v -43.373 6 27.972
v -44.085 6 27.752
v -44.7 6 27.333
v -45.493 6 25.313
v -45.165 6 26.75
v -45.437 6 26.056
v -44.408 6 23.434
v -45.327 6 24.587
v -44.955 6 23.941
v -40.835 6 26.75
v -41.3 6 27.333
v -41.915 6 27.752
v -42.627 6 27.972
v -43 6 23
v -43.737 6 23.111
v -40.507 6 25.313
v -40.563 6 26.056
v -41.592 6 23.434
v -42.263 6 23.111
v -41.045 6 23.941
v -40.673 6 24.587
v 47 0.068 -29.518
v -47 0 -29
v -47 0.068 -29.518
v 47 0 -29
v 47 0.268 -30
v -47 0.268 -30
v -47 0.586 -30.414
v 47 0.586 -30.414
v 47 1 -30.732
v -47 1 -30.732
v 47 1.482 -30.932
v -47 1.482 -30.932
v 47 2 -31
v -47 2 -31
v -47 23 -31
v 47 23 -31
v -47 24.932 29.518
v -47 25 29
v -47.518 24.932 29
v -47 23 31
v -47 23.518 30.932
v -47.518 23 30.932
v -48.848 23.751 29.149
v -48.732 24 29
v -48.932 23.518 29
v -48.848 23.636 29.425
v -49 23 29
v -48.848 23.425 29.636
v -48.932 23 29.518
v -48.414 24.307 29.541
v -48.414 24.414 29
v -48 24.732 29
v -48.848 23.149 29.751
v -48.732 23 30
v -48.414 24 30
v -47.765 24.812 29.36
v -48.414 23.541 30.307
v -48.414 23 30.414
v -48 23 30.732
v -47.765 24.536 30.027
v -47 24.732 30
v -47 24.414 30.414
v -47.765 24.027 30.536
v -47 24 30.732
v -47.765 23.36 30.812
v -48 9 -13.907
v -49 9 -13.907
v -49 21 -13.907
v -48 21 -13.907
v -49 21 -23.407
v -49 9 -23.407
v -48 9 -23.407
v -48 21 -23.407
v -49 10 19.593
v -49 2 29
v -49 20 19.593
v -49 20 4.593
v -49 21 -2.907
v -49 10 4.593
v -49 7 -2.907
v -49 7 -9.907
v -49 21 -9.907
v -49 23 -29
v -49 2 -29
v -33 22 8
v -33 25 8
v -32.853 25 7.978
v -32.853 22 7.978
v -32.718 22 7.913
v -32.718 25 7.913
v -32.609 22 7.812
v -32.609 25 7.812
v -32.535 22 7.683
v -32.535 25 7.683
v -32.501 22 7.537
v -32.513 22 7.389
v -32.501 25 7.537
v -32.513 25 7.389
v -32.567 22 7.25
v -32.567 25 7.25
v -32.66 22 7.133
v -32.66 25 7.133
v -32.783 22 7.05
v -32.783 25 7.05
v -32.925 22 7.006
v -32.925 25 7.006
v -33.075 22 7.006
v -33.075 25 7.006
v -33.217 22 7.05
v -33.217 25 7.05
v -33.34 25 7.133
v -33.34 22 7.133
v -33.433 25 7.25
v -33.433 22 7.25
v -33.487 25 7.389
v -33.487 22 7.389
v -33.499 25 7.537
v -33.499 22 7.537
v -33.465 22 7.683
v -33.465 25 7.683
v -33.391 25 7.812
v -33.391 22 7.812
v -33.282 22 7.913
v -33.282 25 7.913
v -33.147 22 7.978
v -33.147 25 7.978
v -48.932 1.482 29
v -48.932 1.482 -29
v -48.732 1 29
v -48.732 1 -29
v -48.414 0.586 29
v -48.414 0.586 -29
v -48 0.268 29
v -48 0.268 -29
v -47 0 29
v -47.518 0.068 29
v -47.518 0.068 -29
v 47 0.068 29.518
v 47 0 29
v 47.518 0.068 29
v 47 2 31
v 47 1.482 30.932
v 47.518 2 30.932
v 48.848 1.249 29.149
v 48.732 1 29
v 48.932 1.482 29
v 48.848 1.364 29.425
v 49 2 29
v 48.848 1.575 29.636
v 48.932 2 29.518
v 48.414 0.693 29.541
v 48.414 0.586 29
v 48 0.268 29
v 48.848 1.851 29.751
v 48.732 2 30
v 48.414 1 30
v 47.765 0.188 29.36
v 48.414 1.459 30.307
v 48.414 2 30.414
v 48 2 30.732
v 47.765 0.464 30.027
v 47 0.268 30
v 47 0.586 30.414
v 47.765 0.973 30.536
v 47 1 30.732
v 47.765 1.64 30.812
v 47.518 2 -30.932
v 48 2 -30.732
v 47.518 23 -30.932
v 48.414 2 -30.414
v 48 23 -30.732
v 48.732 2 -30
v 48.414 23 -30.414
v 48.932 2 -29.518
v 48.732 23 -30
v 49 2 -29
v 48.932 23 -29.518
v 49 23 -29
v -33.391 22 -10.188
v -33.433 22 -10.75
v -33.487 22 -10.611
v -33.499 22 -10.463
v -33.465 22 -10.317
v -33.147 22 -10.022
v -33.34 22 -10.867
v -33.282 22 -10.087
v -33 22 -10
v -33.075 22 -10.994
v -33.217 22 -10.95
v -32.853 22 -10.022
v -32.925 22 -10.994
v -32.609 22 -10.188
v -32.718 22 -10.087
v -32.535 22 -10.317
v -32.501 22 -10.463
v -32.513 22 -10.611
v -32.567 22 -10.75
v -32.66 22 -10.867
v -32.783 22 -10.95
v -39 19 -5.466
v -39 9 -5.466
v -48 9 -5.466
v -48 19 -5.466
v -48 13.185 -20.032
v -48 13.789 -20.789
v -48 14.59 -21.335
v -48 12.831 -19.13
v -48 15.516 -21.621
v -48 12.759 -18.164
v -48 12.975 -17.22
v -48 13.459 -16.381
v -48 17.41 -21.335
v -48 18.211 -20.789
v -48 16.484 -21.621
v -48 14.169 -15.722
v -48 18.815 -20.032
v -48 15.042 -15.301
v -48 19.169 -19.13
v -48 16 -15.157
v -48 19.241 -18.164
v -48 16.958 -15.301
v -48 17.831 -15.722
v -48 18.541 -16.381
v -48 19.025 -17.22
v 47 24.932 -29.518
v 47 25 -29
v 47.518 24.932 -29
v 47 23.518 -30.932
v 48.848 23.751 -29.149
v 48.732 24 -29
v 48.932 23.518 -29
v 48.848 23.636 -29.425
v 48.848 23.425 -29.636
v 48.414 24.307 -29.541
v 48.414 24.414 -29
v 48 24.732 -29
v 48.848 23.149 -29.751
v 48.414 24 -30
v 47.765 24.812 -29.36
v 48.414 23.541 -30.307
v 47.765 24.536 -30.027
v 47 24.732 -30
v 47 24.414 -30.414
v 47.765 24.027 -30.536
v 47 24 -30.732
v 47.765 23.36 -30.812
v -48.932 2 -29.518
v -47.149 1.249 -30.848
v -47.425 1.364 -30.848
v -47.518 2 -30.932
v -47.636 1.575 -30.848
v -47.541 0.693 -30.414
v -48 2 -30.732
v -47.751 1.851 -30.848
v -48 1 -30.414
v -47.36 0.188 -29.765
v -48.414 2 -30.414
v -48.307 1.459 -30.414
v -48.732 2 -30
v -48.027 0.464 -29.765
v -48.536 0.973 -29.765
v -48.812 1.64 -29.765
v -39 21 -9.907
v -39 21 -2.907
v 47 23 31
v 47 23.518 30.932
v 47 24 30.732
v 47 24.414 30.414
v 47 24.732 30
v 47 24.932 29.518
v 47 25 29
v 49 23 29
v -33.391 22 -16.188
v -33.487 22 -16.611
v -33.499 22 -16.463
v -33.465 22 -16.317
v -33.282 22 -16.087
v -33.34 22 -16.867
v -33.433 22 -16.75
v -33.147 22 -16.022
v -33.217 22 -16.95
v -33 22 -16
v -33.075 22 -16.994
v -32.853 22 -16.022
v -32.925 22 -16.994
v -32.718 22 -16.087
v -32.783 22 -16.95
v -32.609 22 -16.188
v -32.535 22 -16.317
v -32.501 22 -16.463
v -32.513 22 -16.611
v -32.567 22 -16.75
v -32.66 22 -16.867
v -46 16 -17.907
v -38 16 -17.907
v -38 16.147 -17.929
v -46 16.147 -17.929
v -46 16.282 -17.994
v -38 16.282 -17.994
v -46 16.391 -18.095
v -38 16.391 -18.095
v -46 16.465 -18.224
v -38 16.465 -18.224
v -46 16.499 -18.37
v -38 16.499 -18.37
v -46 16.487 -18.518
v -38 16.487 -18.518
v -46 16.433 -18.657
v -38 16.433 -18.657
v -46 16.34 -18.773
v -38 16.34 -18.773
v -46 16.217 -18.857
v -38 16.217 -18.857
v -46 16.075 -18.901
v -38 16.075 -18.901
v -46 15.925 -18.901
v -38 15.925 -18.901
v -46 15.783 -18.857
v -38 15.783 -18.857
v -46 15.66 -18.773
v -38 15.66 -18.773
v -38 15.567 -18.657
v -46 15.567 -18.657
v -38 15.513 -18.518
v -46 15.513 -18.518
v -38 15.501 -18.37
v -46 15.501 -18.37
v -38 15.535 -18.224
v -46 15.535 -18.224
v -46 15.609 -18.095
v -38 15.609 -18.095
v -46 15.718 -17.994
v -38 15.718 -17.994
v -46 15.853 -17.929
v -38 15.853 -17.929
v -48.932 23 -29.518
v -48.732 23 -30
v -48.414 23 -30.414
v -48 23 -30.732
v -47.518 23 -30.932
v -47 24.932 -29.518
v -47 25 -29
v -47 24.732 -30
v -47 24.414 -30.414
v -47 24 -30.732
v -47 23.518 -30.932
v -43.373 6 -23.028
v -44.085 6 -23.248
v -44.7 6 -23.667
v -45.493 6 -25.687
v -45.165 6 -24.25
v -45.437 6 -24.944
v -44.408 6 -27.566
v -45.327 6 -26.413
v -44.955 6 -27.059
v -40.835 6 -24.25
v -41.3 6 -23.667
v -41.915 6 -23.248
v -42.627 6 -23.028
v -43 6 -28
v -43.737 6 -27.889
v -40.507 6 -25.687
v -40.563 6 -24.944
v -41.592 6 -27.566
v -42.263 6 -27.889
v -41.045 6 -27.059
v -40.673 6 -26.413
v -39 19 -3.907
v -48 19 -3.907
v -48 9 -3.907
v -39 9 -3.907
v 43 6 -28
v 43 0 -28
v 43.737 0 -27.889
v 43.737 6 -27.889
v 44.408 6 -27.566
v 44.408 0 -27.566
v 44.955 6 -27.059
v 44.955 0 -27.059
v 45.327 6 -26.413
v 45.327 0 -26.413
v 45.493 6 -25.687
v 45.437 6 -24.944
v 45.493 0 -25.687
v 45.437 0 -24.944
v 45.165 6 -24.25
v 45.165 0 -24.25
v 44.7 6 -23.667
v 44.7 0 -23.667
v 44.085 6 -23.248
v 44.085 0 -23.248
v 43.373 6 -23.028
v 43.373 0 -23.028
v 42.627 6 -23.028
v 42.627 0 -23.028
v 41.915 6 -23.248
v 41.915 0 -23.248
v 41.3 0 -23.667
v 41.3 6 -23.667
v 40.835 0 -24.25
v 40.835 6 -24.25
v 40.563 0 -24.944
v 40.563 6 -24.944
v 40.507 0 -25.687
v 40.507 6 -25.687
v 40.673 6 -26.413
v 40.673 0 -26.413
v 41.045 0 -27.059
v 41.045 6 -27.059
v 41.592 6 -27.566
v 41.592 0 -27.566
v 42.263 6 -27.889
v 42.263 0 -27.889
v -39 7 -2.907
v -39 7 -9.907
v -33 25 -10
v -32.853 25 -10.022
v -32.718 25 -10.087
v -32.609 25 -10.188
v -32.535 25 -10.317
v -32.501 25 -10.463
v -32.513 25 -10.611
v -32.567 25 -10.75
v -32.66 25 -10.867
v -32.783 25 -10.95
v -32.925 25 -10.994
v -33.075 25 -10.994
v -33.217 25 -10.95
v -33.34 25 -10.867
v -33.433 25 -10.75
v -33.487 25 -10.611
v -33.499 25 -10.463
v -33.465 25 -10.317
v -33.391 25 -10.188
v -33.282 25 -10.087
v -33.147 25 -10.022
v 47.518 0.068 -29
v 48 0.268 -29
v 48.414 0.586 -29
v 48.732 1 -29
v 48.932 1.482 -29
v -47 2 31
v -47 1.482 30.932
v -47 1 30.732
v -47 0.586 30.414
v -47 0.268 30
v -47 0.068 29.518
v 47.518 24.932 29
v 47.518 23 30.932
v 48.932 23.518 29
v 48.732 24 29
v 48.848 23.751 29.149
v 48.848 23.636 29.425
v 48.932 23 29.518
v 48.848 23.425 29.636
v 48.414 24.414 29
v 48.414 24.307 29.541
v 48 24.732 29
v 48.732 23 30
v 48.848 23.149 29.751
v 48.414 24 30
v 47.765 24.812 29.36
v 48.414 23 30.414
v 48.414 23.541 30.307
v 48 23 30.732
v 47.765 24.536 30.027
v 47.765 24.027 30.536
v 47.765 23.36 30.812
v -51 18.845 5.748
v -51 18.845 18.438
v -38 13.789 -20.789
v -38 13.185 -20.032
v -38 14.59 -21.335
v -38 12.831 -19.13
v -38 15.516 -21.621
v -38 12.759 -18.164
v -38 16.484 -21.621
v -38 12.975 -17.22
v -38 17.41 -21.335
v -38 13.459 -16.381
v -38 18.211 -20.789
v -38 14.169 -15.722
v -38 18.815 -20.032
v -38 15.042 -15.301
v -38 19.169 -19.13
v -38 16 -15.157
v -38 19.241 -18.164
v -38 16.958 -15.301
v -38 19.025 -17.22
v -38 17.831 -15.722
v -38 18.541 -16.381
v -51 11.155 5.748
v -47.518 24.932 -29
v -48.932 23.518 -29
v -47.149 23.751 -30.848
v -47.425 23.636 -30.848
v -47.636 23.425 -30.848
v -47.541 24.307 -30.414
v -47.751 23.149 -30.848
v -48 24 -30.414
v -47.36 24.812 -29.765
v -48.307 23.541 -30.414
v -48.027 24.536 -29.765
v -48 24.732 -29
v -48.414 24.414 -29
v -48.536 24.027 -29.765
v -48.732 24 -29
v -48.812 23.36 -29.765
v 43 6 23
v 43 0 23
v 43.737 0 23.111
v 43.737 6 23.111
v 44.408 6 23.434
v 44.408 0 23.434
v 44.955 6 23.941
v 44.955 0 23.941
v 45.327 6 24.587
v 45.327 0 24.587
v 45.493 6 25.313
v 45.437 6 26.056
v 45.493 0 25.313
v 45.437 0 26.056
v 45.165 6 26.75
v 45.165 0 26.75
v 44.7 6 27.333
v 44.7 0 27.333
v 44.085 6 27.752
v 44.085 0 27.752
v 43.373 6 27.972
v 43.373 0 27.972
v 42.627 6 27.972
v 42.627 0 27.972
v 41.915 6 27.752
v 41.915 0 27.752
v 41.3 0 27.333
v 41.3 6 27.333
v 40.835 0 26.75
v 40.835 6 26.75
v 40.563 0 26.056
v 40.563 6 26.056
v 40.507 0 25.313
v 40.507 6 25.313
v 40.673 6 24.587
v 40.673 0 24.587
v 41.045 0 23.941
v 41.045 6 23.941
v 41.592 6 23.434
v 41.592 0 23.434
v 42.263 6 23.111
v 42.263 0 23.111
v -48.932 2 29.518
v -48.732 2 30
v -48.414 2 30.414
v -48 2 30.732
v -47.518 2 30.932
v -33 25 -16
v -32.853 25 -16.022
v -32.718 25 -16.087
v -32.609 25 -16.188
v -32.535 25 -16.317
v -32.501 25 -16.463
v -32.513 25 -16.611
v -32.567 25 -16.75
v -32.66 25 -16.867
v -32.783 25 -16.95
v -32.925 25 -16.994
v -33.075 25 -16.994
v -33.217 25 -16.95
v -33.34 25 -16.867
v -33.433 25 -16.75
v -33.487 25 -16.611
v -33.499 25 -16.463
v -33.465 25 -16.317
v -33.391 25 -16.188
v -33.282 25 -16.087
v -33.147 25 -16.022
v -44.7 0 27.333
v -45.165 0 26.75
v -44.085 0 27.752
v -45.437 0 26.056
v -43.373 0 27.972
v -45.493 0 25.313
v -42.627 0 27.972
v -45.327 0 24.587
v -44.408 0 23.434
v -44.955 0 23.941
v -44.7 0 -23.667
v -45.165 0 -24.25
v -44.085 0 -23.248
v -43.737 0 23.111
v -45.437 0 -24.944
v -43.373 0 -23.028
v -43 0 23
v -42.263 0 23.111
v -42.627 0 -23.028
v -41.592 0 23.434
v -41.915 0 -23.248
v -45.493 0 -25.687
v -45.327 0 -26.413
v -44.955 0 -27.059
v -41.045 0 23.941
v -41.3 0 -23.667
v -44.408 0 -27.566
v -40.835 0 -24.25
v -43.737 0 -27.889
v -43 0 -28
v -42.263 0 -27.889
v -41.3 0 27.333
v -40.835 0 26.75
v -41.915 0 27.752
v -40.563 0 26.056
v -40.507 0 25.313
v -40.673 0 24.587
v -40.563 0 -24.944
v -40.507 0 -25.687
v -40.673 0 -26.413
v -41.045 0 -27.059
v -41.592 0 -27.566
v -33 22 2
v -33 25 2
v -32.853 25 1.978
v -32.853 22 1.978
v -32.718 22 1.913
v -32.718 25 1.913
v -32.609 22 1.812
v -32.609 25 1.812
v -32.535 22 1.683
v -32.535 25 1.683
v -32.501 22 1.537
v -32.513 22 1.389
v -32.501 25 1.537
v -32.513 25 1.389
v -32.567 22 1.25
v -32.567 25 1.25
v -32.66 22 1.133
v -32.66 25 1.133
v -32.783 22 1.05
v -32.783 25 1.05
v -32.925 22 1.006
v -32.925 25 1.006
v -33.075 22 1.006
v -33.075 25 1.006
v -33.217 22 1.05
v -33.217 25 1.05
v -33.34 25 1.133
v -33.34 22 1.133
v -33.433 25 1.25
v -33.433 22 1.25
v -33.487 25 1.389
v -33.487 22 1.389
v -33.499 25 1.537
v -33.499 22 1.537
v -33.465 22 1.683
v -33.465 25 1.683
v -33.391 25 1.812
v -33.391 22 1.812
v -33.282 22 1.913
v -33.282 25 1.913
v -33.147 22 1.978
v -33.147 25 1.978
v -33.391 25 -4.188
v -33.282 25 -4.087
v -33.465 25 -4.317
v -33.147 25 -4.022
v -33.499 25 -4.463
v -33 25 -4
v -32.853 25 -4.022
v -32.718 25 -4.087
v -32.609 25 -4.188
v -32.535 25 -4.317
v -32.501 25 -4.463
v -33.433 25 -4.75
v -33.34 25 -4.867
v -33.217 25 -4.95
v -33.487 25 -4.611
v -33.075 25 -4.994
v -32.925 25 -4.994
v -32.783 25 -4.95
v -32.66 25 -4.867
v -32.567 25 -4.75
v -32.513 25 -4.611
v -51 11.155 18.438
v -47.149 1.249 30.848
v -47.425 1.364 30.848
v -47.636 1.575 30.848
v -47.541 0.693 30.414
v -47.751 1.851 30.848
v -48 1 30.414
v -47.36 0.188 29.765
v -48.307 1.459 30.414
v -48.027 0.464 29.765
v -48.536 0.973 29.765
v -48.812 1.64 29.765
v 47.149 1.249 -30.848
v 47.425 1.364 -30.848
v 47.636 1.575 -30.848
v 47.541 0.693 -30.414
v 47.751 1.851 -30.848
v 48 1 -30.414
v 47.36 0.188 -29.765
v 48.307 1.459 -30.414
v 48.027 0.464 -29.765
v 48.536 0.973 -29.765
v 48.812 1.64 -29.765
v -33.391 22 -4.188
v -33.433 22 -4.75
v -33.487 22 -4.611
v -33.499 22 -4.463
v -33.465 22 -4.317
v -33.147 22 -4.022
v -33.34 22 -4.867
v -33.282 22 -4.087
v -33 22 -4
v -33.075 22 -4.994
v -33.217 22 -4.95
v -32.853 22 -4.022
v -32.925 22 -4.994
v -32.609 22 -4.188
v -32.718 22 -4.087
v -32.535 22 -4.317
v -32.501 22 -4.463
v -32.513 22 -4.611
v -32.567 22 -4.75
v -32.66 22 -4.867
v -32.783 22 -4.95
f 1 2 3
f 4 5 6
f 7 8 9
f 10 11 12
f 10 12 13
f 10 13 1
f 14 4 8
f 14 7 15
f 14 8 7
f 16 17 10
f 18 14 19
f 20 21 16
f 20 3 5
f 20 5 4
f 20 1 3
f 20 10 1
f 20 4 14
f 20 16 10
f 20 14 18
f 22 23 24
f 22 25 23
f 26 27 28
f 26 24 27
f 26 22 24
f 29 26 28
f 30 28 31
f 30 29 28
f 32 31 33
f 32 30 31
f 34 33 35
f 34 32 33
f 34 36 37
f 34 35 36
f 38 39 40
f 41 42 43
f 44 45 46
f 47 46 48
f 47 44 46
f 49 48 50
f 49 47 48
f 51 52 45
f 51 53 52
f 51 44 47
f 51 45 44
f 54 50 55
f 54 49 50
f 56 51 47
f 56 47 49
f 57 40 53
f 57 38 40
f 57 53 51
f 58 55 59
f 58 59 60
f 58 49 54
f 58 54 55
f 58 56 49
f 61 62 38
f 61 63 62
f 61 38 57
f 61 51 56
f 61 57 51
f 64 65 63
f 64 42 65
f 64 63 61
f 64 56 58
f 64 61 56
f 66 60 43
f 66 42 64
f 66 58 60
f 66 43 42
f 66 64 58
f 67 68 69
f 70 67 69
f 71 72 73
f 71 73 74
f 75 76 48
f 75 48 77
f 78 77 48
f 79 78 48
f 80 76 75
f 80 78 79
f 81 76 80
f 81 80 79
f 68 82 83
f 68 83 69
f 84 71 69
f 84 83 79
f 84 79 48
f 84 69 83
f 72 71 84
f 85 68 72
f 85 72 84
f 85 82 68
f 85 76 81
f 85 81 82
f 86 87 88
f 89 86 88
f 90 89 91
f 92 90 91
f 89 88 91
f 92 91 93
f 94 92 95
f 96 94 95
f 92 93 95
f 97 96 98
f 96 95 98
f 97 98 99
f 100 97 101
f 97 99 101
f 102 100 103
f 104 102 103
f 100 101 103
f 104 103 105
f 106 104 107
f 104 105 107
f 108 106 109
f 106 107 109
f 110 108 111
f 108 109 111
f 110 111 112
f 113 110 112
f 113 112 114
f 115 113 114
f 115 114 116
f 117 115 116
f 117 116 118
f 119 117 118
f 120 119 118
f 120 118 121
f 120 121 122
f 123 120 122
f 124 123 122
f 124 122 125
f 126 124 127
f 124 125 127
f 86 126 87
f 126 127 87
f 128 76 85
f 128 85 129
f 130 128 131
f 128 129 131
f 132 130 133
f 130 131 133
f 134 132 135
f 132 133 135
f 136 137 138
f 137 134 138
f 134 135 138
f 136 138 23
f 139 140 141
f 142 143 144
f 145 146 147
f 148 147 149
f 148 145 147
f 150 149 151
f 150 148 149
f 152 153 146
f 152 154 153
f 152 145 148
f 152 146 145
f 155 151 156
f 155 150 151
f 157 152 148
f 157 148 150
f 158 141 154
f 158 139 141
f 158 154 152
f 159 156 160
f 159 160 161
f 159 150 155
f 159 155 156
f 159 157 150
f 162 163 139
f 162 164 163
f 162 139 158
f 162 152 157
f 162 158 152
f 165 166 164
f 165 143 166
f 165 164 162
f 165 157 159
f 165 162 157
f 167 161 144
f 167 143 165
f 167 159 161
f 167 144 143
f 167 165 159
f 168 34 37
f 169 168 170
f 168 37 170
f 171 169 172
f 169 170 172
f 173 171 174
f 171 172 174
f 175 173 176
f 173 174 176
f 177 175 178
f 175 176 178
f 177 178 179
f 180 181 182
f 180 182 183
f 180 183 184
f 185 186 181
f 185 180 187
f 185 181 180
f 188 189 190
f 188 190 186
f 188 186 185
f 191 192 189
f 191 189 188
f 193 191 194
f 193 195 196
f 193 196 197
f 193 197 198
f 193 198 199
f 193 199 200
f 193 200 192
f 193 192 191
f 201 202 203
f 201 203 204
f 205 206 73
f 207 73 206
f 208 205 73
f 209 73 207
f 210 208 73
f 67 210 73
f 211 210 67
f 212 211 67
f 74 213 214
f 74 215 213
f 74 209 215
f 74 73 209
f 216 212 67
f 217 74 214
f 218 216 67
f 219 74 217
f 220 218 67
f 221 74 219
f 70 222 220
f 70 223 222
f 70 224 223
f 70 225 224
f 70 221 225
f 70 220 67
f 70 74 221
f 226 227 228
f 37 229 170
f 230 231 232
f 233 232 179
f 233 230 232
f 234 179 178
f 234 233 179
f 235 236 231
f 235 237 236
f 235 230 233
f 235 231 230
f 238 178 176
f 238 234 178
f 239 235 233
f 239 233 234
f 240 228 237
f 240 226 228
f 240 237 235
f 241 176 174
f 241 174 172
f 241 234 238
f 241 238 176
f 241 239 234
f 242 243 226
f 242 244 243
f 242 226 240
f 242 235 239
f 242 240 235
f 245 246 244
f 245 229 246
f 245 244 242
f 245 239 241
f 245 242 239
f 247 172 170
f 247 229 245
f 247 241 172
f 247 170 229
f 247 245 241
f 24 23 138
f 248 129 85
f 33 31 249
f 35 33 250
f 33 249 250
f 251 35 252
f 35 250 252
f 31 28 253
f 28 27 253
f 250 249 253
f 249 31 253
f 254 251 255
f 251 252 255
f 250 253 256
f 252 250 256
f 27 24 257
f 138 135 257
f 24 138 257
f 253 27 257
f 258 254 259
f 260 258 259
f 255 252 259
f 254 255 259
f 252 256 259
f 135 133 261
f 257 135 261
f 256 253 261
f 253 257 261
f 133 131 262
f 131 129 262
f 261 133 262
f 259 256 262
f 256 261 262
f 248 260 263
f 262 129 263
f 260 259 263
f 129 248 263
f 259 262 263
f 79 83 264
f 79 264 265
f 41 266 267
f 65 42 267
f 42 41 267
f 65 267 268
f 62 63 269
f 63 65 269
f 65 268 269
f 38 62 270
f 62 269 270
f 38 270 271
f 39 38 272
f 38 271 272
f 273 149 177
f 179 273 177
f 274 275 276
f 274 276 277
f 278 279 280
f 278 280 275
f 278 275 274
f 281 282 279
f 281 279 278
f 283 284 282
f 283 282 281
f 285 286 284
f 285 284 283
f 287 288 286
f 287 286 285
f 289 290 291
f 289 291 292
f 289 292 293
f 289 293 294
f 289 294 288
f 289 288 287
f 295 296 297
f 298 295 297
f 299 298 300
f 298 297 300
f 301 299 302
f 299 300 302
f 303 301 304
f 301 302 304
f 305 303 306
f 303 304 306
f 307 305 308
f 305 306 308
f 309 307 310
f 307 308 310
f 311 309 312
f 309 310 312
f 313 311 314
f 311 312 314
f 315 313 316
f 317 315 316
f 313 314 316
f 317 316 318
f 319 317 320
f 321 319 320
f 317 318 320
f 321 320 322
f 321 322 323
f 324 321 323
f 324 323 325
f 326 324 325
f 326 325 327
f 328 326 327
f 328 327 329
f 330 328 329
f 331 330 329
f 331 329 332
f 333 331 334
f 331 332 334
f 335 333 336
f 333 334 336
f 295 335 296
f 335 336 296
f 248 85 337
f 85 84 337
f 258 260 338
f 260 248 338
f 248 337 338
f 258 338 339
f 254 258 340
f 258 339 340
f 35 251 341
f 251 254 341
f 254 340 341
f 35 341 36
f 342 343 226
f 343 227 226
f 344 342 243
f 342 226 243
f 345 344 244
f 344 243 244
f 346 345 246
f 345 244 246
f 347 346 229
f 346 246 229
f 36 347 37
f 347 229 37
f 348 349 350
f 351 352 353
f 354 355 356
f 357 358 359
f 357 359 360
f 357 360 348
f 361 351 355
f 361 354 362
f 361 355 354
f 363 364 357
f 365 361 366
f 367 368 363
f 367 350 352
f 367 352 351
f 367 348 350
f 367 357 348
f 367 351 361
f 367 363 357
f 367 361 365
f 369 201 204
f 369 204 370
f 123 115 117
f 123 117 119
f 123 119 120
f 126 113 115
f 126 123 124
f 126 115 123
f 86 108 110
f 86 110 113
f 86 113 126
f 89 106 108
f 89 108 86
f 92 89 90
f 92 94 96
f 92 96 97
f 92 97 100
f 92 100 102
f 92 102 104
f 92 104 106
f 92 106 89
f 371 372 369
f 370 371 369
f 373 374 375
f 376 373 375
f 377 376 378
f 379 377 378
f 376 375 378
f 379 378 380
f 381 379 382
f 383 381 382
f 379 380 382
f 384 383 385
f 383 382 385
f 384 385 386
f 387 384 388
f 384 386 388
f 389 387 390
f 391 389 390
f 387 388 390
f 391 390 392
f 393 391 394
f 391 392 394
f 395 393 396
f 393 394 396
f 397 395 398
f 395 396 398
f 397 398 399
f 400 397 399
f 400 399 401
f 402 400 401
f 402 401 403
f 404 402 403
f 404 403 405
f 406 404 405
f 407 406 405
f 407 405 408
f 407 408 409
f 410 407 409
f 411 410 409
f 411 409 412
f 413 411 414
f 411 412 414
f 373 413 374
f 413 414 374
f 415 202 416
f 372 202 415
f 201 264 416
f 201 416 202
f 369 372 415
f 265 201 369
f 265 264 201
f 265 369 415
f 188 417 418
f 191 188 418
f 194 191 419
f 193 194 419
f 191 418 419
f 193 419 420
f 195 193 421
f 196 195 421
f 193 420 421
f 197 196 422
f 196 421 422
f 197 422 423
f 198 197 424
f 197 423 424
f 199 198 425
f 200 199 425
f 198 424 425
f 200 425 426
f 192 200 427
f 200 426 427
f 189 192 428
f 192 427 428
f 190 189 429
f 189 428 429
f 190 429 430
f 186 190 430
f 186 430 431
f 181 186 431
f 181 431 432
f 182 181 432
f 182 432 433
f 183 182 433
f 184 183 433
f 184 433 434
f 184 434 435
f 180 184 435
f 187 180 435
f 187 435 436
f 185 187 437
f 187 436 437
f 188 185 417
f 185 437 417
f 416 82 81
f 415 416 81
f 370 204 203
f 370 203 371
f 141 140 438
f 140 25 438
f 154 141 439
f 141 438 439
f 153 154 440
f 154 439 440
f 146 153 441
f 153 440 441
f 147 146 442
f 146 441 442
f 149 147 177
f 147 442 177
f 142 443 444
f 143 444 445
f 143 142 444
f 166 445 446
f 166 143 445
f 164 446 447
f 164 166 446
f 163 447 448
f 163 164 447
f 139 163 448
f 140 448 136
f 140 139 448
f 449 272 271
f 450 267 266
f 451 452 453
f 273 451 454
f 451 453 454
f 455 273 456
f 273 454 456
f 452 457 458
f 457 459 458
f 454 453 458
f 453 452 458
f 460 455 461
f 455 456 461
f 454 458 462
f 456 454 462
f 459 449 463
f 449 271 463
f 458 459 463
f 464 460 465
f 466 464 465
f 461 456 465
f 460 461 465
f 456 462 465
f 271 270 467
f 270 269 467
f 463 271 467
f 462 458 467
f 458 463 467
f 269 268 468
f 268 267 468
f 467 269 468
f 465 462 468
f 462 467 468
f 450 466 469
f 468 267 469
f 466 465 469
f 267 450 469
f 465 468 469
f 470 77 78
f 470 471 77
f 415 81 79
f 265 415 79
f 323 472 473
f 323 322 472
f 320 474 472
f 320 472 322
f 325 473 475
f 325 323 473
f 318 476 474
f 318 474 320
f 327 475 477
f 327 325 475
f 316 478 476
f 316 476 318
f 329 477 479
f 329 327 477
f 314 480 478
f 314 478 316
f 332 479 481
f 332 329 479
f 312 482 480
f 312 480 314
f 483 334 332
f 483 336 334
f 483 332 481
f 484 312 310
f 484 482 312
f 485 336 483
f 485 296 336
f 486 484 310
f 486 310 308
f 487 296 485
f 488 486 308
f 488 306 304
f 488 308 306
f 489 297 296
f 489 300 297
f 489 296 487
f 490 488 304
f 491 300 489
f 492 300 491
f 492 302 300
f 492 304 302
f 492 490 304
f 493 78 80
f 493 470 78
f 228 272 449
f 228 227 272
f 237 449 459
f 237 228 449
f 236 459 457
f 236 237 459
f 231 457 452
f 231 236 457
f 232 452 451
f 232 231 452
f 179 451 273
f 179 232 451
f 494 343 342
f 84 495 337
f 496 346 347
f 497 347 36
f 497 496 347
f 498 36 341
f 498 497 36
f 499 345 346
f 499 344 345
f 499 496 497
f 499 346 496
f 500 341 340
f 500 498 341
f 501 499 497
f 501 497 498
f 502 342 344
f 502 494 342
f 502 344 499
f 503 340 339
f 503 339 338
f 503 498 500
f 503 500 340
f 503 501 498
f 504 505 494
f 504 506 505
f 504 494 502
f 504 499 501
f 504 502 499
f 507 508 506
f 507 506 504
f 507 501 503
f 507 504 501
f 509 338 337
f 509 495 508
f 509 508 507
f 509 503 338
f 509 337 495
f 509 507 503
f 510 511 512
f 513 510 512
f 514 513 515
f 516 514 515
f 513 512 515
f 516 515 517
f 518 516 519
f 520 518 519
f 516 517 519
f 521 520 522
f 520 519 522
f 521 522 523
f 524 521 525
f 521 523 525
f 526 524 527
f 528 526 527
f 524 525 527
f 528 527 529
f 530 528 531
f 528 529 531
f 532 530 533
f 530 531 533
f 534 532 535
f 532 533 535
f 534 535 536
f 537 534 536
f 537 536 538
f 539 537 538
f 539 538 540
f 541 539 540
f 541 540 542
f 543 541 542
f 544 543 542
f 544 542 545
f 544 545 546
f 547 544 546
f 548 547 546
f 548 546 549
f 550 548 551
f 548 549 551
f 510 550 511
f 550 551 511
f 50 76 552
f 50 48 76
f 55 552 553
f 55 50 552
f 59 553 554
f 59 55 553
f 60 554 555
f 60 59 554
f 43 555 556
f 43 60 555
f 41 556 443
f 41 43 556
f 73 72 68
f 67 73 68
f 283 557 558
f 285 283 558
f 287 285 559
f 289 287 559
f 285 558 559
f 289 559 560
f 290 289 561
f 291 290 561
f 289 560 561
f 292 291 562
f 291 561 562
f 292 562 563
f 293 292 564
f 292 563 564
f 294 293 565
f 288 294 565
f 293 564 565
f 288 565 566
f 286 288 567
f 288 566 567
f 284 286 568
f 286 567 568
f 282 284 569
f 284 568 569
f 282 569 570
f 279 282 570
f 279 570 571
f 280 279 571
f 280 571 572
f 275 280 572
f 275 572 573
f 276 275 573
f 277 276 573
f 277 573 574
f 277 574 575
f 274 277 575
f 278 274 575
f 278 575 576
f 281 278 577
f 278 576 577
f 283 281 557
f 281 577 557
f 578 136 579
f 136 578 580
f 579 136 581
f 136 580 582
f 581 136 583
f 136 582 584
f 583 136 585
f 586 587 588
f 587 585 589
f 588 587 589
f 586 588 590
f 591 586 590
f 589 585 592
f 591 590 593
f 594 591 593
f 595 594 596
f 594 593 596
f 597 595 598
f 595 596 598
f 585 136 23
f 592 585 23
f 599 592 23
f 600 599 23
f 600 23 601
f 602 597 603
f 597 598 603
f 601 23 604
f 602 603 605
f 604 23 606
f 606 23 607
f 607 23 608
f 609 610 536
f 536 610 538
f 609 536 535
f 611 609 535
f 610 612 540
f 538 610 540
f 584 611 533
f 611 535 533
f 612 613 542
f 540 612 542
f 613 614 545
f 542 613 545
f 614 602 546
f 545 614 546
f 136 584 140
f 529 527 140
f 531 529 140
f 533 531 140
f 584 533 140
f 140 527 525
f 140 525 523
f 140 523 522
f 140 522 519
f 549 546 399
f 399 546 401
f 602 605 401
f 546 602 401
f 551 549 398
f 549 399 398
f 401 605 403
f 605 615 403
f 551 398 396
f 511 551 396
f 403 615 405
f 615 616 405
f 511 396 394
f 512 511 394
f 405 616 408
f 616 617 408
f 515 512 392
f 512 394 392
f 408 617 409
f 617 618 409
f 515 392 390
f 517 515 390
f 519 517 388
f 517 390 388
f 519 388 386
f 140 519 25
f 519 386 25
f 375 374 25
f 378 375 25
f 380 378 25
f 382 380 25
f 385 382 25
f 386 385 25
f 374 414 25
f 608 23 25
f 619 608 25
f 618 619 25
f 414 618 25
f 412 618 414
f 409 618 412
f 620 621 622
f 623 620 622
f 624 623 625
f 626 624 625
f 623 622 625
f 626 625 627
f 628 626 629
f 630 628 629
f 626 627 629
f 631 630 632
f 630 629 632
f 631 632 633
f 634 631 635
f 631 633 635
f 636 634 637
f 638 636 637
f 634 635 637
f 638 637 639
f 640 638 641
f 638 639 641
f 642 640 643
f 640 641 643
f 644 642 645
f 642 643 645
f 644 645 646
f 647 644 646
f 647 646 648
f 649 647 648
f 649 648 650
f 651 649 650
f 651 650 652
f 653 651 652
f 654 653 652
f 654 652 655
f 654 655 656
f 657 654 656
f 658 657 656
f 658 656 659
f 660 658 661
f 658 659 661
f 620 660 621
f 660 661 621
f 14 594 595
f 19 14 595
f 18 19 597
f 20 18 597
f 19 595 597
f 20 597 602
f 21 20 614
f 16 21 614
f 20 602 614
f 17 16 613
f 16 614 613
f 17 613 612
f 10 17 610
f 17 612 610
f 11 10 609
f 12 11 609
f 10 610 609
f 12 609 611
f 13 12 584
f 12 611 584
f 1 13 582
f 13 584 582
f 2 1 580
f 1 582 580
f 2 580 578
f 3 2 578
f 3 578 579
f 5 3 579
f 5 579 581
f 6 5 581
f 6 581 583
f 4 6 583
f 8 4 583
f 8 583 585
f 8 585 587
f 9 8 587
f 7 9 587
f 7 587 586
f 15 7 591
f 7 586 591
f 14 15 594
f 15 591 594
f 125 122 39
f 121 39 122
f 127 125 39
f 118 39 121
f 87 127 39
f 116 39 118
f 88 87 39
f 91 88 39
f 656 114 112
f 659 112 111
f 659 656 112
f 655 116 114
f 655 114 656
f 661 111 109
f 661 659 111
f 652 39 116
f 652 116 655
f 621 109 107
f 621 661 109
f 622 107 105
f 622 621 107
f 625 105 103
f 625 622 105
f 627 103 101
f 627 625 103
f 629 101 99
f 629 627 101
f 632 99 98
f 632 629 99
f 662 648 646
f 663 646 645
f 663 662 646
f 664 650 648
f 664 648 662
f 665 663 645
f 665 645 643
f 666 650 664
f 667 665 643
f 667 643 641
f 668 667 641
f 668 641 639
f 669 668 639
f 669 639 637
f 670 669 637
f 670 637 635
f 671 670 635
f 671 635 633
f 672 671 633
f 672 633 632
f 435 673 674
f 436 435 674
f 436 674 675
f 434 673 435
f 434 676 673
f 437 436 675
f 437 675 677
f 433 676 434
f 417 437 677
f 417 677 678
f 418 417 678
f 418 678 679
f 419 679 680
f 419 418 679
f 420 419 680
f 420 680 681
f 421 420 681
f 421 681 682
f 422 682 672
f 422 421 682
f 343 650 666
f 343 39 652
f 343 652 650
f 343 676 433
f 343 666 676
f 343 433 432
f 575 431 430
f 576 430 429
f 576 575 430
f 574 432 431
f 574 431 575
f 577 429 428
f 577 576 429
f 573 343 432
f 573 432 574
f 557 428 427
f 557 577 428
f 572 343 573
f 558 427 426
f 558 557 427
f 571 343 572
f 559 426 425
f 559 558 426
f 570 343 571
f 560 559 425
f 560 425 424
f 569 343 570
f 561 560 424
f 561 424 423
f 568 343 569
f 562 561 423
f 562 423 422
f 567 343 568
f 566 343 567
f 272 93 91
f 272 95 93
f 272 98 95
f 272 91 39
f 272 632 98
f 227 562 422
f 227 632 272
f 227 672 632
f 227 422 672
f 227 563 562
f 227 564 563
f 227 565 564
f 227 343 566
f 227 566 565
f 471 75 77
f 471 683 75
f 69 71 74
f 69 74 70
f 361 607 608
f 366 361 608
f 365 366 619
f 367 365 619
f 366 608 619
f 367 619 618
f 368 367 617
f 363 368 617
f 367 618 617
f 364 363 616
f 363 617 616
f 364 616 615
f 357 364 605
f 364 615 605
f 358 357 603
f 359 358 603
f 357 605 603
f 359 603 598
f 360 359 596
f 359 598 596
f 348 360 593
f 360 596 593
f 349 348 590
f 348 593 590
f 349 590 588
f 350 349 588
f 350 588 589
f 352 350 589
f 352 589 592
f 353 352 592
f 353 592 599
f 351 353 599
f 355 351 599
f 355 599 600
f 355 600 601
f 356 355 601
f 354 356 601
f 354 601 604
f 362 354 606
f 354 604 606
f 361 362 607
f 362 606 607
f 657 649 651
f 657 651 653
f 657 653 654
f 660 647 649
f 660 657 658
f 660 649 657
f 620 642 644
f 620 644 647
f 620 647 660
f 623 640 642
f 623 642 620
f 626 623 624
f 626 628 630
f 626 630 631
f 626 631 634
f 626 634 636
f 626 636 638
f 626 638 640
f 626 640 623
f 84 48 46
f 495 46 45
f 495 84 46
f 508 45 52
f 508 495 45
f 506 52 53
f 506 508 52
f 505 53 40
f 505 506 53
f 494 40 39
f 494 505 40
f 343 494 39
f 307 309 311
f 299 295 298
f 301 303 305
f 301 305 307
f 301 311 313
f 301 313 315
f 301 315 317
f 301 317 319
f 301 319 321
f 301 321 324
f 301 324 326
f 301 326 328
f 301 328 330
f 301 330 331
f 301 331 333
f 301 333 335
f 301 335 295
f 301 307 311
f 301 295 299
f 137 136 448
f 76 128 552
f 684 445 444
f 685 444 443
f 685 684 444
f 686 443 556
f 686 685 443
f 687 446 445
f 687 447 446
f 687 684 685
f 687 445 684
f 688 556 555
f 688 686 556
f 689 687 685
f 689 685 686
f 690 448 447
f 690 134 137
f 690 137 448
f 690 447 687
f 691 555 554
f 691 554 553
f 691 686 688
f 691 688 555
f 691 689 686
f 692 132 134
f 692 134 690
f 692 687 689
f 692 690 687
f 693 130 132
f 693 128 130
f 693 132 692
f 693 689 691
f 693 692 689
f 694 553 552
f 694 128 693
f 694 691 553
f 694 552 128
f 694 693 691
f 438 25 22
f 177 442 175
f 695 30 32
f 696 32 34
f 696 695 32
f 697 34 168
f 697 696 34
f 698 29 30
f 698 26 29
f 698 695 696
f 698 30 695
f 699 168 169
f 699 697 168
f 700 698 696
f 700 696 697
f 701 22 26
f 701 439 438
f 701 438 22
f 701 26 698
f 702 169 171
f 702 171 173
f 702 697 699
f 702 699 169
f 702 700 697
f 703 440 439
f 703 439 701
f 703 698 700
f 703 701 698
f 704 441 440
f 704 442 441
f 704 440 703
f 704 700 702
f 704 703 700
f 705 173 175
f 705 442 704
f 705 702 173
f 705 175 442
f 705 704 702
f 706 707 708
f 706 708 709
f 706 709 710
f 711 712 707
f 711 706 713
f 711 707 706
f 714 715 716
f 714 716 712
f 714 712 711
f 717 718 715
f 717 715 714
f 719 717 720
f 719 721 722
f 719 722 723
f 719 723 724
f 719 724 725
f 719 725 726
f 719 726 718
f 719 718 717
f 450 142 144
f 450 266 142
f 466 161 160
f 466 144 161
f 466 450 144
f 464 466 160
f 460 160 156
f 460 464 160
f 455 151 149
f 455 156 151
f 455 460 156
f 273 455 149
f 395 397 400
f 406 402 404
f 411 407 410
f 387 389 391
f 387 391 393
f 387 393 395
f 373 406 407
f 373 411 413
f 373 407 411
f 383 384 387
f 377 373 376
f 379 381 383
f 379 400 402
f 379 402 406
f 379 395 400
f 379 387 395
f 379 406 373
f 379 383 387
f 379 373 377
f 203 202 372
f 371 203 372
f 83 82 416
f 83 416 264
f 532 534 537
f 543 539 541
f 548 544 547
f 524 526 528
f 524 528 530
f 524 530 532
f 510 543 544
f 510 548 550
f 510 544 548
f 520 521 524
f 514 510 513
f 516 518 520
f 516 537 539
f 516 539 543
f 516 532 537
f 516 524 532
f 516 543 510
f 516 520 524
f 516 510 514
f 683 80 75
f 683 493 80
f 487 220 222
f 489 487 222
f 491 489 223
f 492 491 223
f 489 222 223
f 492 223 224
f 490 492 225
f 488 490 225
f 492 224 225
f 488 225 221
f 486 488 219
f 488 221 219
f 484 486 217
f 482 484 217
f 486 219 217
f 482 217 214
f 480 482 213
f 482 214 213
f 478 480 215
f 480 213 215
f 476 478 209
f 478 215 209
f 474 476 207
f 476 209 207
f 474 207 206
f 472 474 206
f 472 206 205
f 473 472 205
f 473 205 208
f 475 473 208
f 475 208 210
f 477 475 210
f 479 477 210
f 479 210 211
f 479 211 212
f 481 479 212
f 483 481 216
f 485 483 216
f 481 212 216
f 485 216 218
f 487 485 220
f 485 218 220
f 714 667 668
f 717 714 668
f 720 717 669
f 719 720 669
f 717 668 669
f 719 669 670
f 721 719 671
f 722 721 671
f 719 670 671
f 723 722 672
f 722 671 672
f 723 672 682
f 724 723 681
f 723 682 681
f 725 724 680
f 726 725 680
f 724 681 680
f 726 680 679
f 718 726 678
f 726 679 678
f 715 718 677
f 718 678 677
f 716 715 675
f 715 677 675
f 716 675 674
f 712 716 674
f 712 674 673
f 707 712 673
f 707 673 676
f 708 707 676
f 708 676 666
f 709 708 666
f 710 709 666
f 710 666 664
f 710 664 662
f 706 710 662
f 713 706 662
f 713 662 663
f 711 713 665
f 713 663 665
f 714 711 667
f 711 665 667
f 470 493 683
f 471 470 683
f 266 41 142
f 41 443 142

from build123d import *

# Parameters (mm, degrees)
SKETCH2_W           = 98
SKETCH2_H           = 62
BOSS_EXTRUDE1_DEPTH = 25
SKETCH3_W           = 9.5
SKETCH3_H           = 12
BOSS_EXTRUDE4_DEPTH = 1
SKETCH3_5_W         = 9.5
SKETCH3_5_H         = 12
CUT_EXTRUDE1_DEPTH  = 1
SKETCH4_R           = 3.25
CUT_EXTRUDE2_DEPTH  = 10
SKETCH5_R           = 0.5
BOSS_EXTRUDE5_DEPTH = 8
SKETCH6_W           = 7
SKETCH6_H           = 14
CUT_EXTRUDE9_DEPTH  = 10
SKETCH7_W           = 1.559437484
SKETCH7_H           = 10
BOSS_EXTRUDE6_DEPTH = 9
SKETCH8_W           = 15
SKETCH8_H           = 10
BOSS_EXTRUDE7_DEPTH = 2
BOSS_EXTRUDE7_TAPER = 30
FILLET5_R           = 2
SKETCH10_R          = 2.5
CUT_EXTRUDE10_DEPTH = 6
SKETCH11_R          = 0.5
CUT_EXTRUDE11_DEPTH = 3


with BuildPart() as part:
    # Sketch2 → Boss-Extrude1 (new body)
    with BuildSketch(Plane(origin=(0, 0, 0), x_dir=(1, 0, 0), z_dir=(0, 1, 0))):
        Rectangle(SKETCH2_W, SKETCH2_H)
    extrude(amount=BOSS_EXTRUDE1_DEPTH)

    # Sketch3 → Boss-Extrude4 (add)
    with BuildSketch(Plane.ZY.offset(49)):
        with Locations((-18.656971736, 15)):
            Rectangle(SKETCH3_W, SKETCH3_H)
    extrude(amount=-BOSS_EXTRUDE4_DEPTH)

    # Sketch3<5> → Cut-Extrude1 (cut)
    with BuildSketch(Plane.ZY.offset(49)):
        with Locations((-18.656971736, 15)):
            Rectangle(SKETCH3_5_W, SKETCH3_5_H)
    extrude(amount=-CUT_EXTRUDE1_DEPTH, mode=Mode.SUBTRACT)

    # Sketch4 → Cut-Extrude2 (cut)
    with BuildSketch(Plane.ZY.offset(48)):
        with Locations((-18.406971736, 16)):
            Circle(SKETCH4_R)
    extrude(amount=-CUT_EXTRUDE2_DEPTH, mode=Mode.SUBTRACT)

    # Sketch5 → Boss-Extrude5 (add)
    with BuildSketch(Plane.ZY.offset(38)):
        with Locations((-18.406971736, 16)):
            Circle(SKETCH5_R)
    extrude(amount=BOSS_EXTRUDE5_DEPTH)

    # Sketch6 → Cut-Extrude9 (cut)
    with BuildSketch(Plane.ZY.offset(49)):
        with Locations((-6.406971736, 14)):
            Rectangle(SKETCH6_W, SKETCH6_H)
    extrude(amount=-CUT_EXTRUDE9_DEPTH, mode=Mode.SUBTRACT)

    # Sketch7 → Boss-Extrude6 (add)
    with BuildSketch(Plane.ZY.offset(39)):
        with Locations((-4.686690478, 14)):
            Rectangle(SKETCH7_W, SKETCH7_H)
    extrude(amount=BOSS_EXTRUDE6_DEPTH)

    # Sketch8 → Boss-Extrude7 (add)
    with BuildSketch(Plane.ZY.offset(49)):
        with Locations((12.093028264, 15)):
            Rectangle(SKETCH8_W, SKETCH8_H)
    extrude(amount=BOSS_EXTRUDE7_DEPTH, taper=BOSS_EXTRUDE7_TAPER)

    # Fillet5
    fillet5_edges = [part.edges().sort_by_distance(p)[0] for p in [
        (49, 12.5, -31),
        (0, 25, -31),
        (-49, 12.5, -31),
        (0, 0, -31),
        (-49, 0, 0),
        (-49, 12.5, 31),
        (0, 0, 31),
        (49, 0, 0),
        (49, 25, 0),
        (49, 12.5, 31),
        (-49, 25, 0),
        (0, 25, 31),
    ]]
    fillet(fillet5_edges, radius=FILLET5_R)

    # Sketch10 → Cut-Extrude10 (cut)
    with BuildSketch(Plane.XZ):
        with Locations((-43, -25.5)):
            Circle(SKETCH10_R)
        with Locations((-43, 25.5)):
            Circle(SKETCH10_R)
        with Locations((43, 25.5)):
            Circle(SKETCH10_R)
        with Locations((43, -25.5)):
            Circle(SKETCH10_R)
    extrude(amount=-CUT_EXTRUDE10_DEPTH, mode=Mode.SUBTRACT)

    # Sketch11 → Cut-Extrude11 (cut)
    with BuildSketch(Plane(origin=(0, 25, 0), x_dir=(1, 0, 0), z_dir=(0, 1, 0))):
        with Locations((-33, 16.5)):
            Circle(SKETCH11_R)
        with Locations((-33, 10.5)):
            Circle(SKETCH11_R)
        with Locations((-33, 4.5)):
            Circle(SKETCH11_R)
        with Locations((-33, -1.5)):
            Circle(SKETCH11_R)
        with Locations((-33, -7.5)):
            Circle(SKETCH11_R)
    extrude(amount=-CUT_EXTRUDE11_DEPTH, mode=Mode.SUBTRACT)


solid = part.part
